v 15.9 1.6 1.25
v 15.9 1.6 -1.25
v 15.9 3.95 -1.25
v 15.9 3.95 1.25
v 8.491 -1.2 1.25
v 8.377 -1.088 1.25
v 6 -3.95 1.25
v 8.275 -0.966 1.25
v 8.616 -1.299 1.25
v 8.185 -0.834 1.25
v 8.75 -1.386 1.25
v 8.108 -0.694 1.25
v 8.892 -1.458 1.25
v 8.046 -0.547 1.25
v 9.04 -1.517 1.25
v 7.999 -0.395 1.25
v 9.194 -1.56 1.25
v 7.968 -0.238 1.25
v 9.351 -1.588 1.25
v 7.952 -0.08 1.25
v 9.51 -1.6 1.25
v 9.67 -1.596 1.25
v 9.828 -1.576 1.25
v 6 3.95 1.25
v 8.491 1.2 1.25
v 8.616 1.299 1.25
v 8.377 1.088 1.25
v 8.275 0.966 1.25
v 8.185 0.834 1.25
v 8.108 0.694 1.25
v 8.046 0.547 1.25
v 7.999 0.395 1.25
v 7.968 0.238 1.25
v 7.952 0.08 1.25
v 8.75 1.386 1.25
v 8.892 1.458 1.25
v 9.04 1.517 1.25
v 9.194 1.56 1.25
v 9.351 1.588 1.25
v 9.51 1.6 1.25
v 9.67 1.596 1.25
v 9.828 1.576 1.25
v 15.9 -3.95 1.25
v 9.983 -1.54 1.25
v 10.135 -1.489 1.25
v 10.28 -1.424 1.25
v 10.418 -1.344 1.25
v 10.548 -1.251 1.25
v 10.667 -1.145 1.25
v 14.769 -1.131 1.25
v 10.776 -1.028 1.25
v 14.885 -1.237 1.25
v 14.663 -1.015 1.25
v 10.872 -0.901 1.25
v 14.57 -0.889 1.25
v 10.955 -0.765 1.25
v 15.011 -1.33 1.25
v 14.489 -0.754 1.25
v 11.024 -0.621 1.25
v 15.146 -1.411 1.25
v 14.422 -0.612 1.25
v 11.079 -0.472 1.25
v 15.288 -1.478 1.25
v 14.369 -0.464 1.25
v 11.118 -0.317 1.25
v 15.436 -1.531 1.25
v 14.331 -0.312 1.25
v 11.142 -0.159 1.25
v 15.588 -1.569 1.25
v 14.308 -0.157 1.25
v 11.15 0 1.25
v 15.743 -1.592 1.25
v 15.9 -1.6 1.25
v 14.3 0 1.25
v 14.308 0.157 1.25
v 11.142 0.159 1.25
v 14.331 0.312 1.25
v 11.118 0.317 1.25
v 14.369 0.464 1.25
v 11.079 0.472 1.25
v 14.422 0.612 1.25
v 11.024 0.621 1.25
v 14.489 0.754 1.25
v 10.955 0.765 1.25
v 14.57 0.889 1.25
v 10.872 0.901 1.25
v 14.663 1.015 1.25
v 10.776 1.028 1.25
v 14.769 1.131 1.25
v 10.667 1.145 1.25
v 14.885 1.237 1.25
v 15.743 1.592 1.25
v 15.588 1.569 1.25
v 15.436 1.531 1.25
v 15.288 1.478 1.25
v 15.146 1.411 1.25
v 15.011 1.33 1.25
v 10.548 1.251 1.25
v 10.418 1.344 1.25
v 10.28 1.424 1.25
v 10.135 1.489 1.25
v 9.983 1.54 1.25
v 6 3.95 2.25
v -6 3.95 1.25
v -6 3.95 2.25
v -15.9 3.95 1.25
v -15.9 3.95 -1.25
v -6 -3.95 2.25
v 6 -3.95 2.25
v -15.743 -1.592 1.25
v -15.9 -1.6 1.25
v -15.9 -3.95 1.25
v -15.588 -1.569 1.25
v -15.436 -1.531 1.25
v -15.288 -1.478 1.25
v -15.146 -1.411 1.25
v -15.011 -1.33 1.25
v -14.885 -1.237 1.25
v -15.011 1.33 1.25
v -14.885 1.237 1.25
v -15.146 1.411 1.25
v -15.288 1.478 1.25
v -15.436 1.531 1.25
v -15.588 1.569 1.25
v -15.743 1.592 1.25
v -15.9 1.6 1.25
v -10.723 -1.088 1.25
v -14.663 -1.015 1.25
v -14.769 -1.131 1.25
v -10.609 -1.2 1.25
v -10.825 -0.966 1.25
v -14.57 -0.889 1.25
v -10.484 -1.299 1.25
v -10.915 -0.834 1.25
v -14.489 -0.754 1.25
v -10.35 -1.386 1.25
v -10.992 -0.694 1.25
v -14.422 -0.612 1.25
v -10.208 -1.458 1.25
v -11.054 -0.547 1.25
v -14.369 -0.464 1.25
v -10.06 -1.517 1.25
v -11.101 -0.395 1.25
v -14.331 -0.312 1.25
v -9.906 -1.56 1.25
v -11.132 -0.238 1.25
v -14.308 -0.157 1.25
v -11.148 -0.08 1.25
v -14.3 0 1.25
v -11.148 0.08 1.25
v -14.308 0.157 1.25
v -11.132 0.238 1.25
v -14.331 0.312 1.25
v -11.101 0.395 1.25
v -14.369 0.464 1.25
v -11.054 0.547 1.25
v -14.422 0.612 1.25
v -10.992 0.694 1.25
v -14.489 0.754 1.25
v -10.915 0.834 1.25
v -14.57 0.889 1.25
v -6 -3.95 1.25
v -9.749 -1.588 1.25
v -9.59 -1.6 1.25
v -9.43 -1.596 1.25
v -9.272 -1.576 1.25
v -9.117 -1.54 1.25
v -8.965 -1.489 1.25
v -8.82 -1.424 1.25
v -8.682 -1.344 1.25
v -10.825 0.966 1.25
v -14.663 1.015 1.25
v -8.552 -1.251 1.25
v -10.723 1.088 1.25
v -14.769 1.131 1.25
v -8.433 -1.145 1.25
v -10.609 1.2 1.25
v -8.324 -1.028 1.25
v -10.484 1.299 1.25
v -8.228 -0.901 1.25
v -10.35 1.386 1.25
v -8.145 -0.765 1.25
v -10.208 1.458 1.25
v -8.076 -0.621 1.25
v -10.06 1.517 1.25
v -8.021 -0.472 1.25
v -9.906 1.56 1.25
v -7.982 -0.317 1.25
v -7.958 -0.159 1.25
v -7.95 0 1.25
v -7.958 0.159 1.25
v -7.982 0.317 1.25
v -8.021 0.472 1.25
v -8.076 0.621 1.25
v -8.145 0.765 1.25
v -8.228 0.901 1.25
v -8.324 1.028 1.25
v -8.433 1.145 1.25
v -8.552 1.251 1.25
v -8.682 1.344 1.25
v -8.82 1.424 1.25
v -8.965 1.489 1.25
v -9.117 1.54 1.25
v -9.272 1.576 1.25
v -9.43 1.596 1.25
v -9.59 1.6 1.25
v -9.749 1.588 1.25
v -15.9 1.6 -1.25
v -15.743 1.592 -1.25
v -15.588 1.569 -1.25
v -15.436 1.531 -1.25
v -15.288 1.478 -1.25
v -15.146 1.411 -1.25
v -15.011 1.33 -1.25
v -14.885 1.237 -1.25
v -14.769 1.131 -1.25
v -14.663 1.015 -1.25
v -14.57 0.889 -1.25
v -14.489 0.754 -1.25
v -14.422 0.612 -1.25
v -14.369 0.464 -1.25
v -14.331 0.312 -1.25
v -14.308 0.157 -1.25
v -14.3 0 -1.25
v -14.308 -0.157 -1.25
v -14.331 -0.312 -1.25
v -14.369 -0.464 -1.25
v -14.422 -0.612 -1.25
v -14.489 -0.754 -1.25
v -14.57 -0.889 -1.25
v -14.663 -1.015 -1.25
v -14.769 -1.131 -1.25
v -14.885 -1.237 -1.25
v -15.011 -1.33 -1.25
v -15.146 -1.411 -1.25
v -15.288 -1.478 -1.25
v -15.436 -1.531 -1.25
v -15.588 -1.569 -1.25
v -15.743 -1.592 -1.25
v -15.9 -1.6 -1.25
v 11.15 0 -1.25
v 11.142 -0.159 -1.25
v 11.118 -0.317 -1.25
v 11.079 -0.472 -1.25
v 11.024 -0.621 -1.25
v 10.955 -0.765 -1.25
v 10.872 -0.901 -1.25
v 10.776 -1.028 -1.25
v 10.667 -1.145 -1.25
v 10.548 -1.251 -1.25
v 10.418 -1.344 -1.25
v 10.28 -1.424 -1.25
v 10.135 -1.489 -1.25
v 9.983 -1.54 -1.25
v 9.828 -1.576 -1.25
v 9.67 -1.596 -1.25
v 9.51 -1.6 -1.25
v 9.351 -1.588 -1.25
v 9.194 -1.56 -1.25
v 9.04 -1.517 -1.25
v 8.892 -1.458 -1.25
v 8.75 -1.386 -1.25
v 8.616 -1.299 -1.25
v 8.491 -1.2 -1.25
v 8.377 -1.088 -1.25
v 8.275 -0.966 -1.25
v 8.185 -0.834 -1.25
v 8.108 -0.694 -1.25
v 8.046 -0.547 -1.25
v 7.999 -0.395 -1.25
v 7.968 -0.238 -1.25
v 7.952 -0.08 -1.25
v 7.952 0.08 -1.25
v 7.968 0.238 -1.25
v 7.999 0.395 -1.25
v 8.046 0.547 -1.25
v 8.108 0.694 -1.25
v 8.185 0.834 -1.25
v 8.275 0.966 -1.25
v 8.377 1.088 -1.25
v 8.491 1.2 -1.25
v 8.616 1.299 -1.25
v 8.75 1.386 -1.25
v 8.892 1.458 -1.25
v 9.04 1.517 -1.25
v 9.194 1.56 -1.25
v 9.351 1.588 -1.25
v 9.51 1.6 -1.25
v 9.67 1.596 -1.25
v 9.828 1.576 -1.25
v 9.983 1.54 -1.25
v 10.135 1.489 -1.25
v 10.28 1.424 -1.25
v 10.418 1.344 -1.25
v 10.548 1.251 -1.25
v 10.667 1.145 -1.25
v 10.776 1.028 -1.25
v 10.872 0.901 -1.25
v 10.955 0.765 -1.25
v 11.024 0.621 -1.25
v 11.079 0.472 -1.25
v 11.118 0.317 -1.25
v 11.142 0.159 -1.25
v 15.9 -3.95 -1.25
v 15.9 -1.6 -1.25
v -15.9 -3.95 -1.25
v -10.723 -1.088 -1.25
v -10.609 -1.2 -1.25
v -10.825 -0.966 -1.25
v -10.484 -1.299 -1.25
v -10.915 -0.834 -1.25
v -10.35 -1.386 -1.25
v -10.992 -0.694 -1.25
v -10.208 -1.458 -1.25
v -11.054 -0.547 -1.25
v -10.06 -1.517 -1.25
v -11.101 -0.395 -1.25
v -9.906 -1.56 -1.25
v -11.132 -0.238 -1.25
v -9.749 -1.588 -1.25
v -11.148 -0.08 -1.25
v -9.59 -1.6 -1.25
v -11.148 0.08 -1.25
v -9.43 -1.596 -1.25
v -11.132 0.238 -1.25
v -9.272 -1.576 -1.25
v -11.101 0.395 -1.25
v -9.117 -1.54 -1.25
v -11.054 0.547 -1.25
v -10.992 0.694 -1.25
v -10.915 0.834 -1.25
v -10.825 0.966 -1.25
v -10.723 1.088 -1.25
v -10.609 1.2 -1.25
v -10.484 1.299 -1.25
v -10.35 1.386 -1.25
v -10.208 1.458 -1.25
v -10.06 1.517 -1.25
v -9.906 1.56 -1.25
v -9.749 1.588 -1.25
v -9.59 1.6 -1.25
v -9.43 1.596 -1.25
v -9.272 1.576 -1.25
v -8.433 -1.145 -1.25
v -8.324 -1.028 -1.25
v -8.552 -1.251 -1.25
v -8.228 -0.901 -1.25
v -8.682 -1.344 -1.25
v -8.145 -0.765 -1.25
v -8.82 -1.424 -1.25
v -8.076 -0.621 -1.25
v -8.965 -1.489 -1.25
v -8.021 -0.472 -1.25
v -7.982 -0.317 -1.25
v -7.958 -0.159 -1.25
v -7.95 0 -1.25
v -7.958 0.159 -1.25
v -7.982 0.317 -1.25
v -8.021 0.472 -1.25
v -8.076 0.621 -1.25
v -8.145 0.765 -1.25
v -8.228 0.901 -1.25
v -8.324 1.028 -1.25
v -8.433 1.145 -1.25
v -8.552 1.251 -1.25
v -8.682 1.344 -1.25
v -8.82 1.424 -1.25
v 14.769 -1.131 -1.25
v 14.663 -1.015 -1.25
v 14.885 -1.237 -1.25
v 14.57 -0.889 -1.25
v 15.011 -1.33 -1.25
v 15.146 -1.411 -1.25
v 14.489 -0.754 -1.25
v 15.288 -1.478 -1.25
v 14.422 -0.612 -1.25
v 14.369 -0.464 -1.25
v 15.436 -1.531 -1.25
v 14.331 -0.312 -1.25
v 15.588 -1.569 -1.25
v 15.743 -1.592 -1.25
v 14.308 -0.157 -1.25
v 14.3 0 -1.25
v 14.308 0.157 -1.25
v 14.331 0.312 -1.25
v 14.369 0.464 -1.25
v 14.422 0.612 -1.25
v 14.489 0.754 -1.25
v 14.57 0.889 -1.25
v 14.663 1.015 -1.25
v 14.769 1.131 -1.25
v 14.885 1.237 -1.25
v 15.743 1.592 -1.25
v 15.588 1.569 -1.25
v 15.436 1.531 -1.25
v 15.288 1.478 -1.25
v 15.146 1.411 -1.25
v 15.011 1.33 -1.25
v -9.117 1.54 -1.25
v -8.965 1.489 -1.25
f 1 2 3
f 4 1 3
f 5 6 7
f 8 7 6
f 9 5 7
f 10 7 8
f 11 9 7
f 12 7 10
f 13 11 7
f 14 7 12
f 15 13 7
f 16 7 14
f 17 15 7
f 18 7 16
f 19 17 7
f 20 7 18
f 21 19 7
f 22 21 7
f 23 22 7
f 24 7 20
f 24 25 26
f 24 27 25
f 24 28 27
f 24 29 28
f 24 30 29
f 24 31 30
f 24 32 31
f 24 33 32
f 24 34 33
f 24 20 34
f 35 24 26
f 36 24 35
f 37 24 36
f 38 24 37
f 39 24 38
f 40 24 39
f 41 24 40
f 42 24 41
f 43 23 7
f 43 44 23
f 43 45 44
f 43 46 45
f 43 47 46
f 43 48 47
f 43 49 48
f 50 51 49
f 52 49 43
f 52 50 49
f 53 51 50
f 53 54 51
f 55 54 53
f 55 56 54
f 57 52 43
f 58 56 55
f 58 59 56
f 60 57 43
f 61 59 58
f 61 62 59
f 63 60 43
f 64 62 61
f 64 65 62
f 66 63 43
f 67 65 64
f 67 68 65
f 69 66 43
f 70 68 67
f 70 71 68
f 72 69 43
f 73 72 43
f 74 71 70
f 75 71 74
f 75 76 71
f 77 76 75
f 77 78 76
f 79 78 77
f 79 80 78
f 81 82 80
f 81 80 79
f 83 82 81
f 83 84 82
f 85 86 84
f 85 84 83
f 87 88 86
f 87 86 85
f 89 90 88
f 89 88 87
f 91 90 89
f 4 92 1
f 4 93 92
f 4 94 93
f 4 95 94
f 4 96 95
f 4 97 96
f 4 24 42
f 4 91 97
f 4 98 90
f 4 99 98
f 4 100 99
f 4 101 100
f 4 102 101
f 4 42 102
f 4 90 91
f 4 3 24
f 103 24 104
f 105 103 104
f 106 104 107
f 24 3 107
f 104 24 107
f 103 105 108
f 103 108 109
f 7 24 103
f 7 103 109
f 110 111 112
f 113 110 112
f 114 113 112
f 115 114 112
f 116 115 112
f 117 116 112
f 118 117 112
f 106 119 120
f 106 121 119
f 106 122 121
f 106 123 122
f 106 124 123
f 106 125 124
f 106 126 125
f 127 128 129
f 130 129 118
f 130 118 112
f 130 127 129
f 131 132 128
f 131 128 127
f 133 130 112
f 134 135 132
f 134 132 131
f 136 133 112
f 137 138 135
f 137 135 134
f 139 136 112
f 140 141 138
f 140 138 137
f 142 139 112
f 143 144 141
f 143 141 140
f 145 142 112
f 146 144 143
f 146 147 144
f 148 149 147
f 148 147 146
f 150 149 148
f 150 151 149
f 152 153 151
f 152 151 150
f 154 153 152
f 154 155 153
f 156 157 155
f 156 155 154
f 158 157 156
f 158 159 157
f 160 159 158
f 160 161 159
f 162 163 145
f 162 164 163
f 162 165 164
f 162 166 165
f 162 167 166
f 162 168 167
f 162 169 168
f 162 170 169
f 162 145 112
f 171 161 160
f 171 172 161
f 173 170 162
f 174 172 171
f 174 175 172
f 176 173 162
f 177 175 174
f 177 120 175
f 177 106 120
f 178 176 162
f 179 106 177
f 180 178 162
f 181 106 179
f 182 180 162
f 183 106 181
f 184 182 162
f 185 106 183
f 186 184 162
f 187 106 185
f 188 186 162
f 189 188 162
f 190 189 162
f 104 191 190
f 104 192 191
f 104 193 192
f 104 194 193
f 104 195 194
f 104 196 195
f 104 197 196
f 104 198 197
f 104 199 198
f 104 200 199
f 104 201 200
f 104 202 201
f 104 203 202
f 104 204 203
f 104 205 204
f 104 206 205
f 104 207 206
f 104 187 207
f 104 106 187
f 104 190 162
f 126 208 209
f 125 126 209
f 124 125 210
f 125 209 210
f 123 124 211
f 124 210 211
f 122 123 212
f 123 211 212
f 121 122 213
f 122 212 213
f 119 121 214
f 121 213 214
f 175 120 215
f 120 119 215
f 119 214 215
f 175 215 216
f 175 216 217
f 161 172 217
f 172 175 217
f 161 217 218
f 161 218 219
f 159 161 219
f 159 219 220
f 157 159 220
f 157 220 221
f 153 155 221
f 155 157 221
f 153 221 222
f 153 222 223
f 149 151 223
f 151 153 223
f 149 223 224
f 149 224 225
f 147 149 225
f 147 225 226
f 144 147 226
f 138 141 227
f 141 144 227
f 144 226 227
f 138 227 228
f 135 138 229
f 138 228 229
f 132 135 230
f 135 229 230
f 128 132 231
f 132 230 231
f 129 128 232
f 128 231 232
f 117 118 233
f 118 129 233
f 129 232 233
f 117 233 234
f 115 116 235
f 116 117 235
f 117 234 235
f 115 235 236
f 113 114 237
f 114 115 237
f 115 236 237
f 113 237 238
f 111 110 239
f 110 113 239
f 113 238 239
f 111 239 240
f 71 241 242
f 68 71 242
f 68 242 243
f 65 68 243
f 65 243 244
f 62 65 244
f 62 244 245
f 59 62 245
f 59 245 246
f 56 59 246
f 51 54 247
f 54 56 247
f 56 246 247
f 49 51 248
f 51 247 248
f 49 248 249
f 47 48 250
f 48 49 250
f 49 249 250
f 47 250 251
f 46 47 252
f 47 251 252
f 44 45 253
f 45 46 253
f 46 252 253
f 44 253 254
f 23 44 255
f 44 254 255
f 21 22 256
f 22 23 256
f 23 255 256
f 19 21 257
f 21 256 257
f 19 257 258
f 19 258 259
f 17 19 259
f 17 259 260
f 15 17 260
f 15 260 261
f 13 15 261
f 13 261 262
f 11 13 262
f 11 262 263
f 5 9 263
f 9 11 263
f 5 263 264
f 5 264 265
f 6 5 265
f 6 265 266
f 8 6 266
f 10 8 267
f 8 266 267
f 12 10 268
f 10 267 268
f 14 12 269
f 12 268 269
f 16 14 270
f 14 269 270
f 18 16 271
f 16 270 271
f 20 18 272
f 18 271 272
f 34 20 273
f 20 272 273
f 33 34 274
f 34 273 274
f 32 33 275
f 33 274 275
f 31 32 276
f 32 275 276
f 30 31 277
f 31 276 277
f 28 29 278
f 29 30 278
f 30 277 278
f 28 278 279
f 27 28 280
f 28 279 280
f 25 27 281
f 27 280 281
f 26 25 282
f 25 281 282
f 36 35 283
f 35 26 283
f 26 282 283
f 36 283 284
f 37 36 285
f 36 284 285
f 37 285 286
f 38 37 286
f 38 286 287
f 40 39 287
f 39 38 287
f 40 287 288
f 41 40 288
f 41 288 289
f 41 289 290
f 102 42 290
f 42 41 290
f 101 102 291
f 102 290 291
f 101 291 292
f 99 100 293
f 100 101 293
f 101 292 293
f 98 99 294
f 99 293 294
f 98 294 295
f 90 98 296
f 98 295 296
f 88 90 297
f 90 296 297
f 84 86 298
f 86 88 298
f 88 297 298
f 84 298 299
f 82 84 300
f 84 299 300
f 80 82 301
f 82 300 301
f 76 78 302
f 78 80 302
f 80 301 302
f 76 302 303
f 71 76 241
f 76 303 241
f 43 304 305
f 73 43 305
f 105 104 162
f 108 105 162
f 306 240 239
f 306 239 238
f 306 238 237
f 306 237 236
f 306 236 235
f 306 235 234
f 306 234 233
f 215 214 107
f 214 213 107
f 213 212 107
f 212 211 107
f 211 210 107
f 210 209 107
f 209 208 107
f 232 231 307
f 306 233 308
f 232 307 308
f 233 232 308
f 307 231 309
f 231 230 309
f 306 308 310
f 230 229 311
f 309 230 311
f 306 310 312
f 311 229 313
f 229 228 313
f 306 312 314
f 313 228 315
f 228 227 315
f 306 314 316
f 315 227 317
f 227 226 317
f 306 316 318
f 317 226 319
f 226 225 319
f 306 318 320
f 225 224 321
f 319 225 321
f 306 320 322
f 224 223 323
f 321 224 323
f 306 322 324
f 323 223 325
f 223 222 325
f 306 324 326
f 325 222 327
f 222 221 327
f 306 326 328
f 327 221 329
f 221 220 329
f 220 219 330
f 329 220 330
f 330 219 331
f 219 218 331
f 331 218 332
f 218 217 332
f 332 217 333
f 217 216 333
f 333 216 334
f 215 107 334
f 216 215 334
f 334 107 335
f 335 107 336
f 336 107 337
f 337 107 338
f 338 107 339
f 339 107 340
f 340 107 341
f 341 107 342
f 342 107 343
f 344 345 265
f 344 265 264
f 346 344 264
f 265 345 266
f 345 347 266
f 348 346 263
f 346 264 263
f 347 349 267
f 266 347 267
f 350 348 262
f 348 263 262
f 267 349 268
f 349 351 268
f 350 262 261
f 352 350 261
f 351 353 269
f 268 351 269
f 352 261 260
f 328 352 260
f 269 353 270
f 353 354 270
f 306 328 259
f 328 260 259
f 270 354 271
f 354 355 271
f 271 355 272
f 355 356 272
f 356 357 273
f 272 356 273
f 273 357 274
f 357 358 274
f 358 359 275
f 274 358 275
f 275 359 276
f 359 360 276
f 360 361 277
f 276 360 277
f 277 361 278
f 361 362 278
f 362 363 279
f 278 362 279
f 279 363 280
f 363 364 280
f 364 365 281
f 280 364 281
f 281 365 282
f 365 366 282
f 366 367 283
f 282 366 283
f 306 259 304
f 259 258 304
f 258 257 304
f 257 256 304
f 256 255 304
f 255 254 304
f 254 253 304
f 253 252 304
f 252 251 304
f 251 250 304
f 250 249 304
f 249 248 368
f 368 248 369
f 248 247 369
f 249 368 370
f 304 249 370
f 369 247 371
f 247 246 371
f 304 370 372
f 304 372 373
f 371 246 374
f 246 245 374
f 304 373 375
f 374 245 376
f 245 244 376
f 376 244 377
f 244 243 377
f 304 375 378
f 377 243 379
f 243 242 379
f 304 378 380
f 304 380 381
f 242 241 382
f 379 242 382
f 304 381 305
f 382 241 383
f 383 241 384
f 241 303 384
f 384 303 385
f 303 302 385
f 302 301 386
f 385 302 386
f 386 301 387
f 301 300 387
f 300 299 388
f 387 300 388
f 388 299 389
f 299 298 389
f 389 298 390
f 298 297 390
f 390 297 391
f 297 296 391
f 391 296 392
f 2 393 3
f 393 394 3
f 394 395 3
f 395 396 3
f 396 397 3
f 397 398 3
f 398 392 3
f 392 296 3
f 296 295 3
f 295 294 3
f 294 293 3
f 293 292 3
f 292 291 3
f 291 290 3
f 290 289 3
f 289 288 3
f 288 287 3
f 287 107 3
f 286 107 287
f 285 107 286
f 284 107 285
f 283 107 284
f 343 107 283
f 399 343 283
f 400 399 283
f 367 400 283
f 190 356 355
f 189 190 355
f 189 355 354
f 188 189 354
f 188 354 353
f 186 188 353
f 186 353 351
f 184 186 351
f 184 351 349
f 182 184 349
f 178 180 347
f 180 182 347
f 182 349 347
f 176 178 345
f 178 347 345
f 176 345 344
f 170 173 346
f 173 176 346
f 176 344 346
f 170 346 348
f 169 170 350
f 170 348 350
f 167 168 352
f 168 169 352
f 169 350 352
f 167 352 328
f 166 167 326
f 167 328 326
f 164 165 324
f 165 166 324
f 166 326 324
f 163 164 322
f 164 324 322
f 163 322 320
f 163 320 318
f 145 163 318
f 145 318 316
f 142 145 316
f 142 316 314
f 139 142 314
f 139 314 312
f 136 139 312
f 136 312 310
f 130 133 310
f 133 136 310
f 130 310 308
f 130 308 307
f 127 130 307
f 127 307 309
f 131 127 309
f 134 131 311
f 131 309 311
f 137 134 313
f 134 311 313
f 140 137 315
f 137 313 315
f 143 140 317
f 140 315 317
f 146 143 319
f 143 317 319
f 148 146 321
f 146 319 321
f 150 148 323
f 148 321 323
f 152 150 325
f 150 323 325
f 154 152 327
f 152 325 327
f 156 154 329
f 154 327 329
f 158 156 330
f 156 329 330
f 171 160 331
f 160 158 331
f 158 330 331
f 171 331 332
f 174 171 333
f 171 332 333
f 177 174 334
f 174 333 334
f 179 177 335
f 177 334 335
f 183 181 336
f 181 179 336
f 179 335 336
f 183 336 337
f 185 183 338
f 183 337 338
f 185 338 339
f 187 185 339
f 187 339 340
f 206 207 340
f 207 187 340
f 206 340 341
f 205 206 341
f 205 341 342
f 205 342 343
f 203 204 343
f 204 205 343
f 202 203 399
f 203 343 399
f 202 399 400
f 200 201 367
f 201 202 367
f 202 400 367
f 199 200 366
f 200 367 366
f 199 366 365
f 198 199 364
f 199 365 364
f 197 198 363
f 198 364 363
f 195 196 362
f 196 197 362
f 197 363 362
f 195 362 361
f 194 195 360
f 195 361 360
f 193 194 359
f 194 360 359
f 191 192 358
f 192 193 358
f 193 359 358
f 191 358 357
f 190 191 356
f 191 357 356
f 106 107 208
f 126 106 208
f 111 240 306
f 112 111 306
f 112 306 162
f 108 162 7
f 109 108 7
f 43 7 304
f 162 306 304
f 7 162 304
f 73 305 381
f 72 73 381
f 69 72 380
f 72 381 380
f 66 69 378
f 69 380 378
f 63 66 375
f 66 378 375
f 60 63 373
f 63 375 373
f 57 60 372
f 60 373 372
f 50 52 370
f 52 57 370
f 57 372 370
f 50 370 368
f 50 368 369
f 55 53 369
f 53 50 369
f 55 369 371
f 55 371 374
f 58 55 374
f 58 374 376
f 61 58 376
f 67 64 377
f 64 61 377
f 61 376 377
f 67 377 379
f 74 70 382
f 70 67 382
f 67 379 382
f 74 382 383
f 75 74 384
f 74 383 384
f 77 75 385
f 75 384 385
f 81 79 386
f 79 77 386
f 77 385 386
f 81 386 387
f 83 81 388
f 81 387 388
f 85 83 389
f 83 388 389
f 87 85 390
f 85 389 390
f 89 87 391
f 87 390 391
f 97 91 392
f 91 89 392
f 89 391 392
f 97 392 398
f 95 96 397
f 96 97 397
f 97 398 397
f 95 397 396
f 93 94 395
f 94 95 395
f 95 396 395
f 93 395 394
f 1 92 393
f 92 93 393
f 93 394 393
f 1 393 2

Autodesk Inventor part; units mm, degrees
ref_plane "YZ Plane" through (0, 0, 0) normal (1, 0, 0) x (0, 1, 0)
ref_plane "XZ Plane" through (0, 0, 0) normal (0, 1, 0) x (-1, 0, 0)
ref_plane "XY Plane" through (0, 0, 0) normal (0, 0, 1) x (1, 0, 0)
sketch "Sketch1" plane through (0, 0, 0) normal (0, 0, 1) x (1, 0, 0)
  line L0 (-15.9, -3.95) -> (15.9, -3.95)
  line L1 (15.9, -3.95) -> (15.9, 3.95)
  line L2 (15.9, 3.95) -> (-15.9, 3.95)
  line L3 (-15.9, 3.95) -> (-15.9, -3.95)
  line L4 (-15.9, -3.95) -> (15.9, 3.95) construction
  line L5 (15.9, -3.95) -> (-15.9, 3.95) construction
  line L6 (-15.9, 0) -> (15.9, 0) construction
  line L7 (0, 3.95) -> (0, -3.95) construction
  circle A0 centre (9.55, 0) radius 1.6
  arc A1 (15.9, 1.6) -> (15.9, -1.6) centre (15.9, 0) ccw
  circle A2 centre (-9.55, 0) radius 1.6
  arc A3 (-15.9, -1.6) -> (-15.9, 1.6) centre (-15.9, 0) ccw
  line L8 (6, 3.95) -> (6, -3.95)
  line L9 (-6, 3.95) -> (-6, -3.95)
  point P0 (0, 0)
  point P1 (-15.9, 1.6)
  point P2 (-15.9, -1.6)
  dimension "d0" = 31.8
  dimension "d1" = 7.9
  dimension "d2" = 3.2
  dimension "d3" = 19.1
  dimension "d4" = 12
extrude "Extrusion1" add sketch "Sketch1" along normal mid plane 2.5 contours L3 A3 L2 L9 L0 | L9 L2 L8 L0 | L8 L2 L1 A1 L0
extrude "Extrusion2" add sketch "Sketch1" along normal blind 2.25 contours L9 L2 L8 L0
properties part number "SC700-40kg"
